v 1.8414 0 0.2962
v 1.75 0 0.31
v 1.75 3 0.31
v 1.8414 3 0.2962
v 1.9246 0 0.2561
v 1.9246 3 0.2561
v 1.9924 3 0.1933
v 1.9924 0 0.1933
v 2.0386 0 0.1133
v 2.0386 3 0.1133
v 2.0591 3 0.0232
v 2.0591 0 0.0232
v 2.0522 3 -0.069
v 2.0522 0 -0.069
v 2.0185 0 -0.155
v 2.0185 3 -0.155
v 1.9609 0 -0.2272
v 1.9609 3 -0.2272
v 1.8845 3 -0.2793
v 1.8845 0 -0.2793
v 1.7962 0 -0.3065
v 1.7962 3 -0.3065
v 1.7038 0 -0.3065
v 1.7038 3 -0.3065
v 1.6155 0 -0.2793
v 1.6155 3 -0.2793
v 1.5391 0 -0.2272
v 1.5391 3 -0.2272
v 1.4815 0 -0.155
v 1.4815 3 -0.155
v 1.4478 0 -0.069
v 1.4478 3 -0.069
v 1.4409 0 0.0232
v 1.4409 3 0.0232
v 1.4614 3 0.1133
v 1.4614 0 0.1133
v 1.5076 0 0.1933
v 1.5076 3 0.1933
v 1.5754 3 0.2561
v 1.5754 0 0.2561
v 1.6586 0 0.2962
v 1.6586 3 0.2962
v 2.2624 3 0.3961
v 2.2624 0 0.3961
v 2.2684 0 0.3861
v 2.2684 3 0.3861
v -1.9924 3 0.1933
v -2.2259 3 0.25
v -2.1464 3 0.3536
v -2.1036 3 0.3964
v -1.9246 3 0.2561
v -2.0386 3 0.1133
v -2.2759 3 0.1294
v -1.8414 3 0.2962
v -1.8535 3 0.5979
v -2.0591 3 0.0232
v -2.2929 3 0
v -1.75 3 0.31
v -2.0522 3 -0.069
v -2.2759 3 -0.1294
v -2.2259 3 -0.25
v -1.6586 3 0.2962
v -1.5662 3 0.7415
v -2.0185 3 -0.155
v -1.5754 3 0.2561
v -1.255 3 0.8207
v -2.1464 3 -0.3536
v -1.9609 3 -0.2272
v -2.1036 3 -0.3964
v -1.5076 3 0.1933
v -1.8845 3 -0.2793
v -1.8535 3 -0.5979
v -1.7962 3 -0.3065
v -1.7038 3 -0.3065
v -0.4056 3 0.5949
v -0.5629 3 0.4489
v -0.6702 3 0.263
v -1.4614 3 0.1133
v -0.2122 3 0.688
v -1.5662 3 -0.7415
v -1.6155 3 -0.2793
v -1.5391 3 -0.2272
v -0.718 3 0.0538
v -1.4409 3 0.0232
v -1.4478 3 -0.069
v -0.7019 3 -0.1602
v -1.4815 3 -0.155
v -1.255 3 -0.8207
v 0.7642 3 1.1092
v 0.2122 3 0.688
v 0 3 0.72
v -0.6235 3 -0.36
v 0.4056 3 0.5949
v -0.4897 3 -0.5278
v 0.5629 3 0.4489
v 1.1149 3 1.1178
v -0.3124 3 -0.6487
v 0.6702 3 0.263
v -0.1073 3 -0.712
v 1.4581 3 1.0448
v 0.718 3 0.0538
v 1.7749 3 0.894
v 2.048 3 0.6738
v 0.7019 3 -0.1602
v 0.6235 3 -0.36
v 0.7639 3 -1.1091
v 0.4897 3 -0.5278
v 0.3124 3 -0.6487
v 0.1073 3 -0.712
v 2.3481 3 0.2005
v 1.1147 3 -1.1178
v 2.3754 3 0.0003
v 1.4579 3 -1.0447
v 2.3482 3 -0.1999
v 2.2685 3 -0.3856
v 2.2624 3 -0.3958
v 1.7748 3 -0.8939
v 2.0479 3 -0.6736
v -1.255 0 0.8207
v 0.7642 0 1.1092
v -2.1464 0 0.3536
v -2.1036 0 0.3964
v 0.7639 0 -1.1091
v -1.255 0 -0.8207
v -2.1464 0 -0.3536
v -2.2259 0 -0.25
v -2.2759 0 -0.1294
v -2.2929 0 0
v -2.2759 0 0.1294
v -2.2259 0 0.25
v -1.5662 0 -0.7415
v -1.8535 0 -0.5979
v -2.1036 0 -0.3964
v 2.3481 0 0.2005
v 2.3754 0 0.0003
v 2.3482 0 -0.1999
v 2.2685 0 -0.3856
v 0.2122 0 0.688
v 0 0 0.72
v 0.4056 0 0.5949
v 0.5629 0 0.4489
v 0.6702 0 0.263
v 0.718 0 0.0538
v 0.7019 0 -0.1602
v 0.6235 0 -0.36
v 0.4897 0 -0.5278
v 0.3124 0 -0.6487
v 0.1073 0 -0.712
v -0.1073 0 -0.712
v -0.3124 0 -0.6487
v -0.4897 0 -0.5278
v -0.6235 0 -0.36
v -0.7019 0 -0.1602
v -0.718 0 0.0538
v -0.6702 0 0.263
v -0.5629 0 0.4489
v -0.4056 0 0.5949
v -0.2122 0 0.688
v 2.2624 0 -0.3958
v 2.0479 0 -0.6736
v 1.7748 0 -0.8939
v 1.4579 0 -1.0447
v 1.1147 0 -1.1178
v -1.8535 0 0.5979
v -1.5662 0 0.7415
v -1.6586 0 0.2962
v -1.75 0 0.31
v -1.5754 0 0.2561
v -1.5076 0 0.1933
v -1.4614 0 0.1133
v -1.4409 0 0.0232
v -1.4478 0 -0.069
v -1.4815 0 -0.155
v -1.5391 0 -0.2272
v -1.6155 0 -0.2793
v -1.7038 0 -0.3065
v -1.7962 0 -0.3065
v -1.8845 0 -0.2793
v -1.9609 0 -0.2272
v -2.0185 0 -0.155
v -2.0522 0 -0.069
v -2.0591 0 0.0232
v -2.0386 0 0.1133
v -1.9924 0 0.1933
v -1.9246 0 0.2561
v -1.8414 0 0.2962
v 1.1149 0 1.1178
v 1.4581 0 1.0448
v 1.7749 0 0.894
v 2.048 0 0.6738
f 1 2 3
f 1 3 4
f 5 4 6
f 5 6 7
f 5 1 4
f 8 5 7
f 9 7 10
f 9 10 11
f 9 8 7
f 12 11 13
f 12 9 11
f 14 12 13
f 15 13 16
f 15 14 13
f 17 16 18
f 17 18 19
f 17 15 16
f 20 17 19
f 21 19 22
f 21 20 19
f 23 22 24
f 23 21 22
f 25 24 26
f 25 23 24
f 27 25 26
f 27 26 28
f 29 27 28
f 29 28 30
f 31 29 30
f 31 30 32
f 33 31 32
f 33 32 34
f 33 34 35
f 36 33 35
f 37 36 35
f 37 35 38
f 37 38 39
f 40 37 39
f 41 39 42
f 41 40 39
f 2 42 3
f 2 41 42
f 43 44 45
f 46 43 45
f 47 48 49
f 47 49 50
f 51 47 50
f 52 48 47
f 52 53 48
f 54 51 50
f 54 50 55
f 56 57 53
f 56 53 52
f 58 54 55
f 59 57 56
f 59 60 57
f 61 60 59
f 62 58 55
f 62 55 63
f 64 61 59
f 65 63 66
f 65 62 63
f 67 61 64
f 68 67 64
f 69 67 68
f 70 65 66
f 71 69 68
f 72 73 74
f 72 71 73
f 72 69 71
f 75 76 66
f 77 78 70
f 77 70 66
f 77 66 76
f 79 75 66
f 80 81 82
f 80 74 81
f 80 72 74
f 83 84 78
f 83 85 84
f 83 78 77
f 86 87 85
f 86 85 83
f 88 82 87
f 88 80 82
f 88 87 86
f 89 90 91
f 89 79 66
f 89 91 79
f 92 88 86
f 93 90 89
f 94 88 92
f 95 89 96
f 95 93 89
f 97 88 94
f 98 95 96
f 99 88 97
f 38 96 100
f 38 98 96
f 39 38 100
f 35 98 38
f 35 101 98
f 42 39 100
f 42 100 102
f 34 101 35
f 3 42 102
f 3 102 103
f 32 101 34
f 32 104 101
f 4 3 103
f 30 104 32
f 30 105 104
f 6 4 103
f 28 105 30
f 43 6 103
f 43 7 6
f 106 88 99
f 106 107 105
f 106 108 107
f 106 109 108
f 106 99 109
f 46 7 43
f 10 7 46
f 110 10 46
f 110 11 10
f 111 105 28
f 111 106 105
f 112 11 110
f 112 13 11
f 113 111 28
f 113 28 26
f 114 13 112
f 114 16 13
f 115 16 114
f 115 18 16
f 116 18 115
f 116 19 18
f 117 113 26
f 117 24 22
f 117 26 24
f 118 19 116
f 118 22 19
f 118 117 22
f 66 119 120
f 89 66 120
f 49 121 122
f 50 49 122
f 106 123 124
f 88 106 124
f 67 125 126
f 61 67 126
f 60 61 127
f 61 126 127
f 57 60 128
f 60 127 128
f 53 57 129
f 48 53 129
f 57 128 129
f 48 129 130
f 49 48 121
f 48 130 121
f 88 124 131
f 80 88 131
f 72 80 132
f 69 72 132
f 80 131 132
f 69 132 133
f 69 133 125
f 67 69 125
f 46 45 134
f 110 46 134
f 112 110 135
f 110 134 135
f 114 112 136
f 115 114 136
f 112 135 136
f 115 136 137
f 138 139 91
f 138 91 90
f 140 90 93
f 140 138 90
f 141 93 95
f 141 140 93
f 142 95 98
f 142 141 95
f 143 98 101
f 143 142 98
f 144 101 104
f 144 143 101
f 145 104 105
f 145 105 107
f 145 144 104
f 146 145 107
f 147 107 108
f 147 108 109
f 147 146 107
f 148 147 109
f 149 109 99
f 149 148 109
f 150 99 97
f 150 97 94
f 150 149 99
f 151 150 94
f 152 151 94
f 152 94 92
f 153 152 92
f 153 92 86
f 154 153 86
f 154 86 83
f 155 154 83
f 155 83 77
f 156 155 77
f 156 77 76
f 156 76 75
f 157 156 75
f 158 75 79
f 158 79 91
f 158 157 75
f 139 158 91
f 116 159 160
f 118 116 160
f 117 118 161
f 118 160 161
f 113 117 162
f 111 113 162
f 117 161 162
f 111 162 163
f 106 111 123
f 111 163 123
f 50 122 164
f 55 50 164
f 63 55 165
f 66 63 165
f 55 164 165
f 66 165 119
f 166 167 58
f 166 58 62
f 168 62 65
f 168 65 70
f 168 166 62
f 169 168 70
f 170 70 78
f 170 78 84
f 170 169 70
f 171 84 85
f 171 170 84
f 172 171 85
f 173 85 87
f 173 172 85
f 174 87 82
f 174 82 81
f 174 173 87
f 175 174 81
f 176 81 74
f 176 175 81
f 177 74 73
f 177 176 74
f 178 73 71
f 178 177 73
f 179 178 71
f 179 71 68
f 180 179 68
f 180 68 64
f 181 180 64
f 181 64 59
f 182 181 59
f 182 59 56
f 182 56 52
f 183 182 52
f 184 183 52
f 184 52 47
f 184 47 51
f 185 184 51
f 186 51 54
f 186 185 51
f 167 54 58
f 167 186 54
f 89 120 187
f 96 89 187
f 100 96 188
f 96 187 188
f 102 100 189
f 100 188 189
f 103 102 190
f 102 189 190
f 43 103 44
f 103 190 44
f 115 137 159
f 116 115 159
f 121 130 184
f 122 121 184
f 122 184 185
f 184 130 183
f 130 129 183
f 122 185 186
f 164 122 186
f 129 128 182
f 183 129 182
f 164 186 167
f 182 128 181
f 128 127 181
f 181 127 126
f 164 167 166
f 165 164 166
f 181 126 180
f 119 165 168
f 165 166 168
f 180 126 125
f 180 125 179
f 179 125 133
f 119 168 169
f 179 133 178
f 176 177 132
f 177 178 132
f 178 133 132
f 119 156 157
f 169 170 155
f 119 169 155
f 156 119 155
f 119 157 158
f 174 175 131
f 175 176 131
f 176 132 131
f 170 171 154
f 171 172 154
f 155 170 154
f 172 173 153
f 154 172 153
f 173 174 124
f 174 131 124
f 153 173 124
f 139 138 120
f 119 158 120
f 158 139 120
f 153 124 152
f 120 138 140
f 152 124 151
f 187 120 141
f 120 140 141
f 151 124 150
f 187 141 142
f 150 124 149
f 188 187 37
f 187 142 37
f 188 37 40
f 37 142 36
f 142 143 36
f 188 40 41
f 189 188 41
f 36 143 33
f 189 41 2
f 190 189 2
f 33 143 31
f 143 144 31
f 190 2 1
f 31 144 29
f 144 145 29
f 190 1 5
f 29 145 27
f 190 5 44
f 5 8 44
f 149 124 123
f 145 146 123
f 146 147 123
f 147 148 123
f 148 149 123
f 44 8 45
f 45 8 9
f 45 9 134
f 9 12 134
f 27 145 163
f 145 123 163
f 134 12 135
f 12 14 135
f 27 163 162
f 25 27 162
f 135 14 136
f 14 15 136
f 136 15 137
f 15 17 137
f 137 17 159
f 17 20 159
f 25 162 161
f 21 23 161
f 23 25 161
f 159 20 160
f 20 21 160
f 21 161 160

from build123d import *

# Parameters (mm, degrees)
SKETCH1_R           = 0.72
SKETCH1_R_2         = 0.31
BOSS_EXTRUDE1_DEPTH = 3


with BuildPart() as part:
    # Sketch1 → Boss-Extrude1 (new body)
    with BuildSketch(Plane(origin=(0, 0, 0), x_dir=(1, 0, 0), z_dir=(0, 1, 0))):
        with BuildLine():
            Line((2.26851387, 0.385599784), (2.262386582, 0.395814417))
            ThreePointArc((2.262386582, 0.395814417), (1.620794549, 0.978580721), (0.763932274, 1.109133182))
            Line((0.763932274, 1.109133182), (-1.255025253, 0.820710678))
            ThreePointArc((-1.255025253, 0.820710678), (-1.713713612, 0.677427224), (-2.103553391, 0.396446609))
            Line((-2.103553391, 0.396446609), (-2.146446609, 0.353553391))
            ThreePointArc((-2.146446609, 0.353553391), (-2.292893219, 0), (-2.146446609, -0.353553391))
            Line((-2.146446609, -0.353553391), (-2.103553391, -0.396446609))
            ThreePointArc((-2.103553391, -0.396446609), (-1.713713612, -0.677427224), (-1.255025253, -0.820710678))
            Line((-1.255025253, -0.820710678), (0.76415397, -1.109164853))
            ThreePointArc((0.76415397, -1.109164853), (1.620875906, -0.978679189), (2.262448348, -0.396112639))
            Line((2.262448348, -0.396112639), (2.268433905, -0.386138967))
            ThreePointArc((2.268433905, -0.386138967), (2.375352729, -0.000280666), (2.26851387, 0.385599784))
        make_face()
        with Locations(Location((0, 0, 0), (0, 0, 270))):
            Circle(SKETCH1_R, mode=Mode.SUBTRACT)
        with Locations(Location((1.75, 0, 0), (0, 0, 270))):
            Circle(SKETCH1_R_2, mode=Mode.SUBTRACT)
        with Locations(Location((-1.75, 0, 0), (0, 0, 270))):
            Circle(SKETCH1_R_2, mode=Mode.SUBTRACT)
    extrude(amount=BOSS_EXTRUDE1_DEPTH)


solid = part.part
